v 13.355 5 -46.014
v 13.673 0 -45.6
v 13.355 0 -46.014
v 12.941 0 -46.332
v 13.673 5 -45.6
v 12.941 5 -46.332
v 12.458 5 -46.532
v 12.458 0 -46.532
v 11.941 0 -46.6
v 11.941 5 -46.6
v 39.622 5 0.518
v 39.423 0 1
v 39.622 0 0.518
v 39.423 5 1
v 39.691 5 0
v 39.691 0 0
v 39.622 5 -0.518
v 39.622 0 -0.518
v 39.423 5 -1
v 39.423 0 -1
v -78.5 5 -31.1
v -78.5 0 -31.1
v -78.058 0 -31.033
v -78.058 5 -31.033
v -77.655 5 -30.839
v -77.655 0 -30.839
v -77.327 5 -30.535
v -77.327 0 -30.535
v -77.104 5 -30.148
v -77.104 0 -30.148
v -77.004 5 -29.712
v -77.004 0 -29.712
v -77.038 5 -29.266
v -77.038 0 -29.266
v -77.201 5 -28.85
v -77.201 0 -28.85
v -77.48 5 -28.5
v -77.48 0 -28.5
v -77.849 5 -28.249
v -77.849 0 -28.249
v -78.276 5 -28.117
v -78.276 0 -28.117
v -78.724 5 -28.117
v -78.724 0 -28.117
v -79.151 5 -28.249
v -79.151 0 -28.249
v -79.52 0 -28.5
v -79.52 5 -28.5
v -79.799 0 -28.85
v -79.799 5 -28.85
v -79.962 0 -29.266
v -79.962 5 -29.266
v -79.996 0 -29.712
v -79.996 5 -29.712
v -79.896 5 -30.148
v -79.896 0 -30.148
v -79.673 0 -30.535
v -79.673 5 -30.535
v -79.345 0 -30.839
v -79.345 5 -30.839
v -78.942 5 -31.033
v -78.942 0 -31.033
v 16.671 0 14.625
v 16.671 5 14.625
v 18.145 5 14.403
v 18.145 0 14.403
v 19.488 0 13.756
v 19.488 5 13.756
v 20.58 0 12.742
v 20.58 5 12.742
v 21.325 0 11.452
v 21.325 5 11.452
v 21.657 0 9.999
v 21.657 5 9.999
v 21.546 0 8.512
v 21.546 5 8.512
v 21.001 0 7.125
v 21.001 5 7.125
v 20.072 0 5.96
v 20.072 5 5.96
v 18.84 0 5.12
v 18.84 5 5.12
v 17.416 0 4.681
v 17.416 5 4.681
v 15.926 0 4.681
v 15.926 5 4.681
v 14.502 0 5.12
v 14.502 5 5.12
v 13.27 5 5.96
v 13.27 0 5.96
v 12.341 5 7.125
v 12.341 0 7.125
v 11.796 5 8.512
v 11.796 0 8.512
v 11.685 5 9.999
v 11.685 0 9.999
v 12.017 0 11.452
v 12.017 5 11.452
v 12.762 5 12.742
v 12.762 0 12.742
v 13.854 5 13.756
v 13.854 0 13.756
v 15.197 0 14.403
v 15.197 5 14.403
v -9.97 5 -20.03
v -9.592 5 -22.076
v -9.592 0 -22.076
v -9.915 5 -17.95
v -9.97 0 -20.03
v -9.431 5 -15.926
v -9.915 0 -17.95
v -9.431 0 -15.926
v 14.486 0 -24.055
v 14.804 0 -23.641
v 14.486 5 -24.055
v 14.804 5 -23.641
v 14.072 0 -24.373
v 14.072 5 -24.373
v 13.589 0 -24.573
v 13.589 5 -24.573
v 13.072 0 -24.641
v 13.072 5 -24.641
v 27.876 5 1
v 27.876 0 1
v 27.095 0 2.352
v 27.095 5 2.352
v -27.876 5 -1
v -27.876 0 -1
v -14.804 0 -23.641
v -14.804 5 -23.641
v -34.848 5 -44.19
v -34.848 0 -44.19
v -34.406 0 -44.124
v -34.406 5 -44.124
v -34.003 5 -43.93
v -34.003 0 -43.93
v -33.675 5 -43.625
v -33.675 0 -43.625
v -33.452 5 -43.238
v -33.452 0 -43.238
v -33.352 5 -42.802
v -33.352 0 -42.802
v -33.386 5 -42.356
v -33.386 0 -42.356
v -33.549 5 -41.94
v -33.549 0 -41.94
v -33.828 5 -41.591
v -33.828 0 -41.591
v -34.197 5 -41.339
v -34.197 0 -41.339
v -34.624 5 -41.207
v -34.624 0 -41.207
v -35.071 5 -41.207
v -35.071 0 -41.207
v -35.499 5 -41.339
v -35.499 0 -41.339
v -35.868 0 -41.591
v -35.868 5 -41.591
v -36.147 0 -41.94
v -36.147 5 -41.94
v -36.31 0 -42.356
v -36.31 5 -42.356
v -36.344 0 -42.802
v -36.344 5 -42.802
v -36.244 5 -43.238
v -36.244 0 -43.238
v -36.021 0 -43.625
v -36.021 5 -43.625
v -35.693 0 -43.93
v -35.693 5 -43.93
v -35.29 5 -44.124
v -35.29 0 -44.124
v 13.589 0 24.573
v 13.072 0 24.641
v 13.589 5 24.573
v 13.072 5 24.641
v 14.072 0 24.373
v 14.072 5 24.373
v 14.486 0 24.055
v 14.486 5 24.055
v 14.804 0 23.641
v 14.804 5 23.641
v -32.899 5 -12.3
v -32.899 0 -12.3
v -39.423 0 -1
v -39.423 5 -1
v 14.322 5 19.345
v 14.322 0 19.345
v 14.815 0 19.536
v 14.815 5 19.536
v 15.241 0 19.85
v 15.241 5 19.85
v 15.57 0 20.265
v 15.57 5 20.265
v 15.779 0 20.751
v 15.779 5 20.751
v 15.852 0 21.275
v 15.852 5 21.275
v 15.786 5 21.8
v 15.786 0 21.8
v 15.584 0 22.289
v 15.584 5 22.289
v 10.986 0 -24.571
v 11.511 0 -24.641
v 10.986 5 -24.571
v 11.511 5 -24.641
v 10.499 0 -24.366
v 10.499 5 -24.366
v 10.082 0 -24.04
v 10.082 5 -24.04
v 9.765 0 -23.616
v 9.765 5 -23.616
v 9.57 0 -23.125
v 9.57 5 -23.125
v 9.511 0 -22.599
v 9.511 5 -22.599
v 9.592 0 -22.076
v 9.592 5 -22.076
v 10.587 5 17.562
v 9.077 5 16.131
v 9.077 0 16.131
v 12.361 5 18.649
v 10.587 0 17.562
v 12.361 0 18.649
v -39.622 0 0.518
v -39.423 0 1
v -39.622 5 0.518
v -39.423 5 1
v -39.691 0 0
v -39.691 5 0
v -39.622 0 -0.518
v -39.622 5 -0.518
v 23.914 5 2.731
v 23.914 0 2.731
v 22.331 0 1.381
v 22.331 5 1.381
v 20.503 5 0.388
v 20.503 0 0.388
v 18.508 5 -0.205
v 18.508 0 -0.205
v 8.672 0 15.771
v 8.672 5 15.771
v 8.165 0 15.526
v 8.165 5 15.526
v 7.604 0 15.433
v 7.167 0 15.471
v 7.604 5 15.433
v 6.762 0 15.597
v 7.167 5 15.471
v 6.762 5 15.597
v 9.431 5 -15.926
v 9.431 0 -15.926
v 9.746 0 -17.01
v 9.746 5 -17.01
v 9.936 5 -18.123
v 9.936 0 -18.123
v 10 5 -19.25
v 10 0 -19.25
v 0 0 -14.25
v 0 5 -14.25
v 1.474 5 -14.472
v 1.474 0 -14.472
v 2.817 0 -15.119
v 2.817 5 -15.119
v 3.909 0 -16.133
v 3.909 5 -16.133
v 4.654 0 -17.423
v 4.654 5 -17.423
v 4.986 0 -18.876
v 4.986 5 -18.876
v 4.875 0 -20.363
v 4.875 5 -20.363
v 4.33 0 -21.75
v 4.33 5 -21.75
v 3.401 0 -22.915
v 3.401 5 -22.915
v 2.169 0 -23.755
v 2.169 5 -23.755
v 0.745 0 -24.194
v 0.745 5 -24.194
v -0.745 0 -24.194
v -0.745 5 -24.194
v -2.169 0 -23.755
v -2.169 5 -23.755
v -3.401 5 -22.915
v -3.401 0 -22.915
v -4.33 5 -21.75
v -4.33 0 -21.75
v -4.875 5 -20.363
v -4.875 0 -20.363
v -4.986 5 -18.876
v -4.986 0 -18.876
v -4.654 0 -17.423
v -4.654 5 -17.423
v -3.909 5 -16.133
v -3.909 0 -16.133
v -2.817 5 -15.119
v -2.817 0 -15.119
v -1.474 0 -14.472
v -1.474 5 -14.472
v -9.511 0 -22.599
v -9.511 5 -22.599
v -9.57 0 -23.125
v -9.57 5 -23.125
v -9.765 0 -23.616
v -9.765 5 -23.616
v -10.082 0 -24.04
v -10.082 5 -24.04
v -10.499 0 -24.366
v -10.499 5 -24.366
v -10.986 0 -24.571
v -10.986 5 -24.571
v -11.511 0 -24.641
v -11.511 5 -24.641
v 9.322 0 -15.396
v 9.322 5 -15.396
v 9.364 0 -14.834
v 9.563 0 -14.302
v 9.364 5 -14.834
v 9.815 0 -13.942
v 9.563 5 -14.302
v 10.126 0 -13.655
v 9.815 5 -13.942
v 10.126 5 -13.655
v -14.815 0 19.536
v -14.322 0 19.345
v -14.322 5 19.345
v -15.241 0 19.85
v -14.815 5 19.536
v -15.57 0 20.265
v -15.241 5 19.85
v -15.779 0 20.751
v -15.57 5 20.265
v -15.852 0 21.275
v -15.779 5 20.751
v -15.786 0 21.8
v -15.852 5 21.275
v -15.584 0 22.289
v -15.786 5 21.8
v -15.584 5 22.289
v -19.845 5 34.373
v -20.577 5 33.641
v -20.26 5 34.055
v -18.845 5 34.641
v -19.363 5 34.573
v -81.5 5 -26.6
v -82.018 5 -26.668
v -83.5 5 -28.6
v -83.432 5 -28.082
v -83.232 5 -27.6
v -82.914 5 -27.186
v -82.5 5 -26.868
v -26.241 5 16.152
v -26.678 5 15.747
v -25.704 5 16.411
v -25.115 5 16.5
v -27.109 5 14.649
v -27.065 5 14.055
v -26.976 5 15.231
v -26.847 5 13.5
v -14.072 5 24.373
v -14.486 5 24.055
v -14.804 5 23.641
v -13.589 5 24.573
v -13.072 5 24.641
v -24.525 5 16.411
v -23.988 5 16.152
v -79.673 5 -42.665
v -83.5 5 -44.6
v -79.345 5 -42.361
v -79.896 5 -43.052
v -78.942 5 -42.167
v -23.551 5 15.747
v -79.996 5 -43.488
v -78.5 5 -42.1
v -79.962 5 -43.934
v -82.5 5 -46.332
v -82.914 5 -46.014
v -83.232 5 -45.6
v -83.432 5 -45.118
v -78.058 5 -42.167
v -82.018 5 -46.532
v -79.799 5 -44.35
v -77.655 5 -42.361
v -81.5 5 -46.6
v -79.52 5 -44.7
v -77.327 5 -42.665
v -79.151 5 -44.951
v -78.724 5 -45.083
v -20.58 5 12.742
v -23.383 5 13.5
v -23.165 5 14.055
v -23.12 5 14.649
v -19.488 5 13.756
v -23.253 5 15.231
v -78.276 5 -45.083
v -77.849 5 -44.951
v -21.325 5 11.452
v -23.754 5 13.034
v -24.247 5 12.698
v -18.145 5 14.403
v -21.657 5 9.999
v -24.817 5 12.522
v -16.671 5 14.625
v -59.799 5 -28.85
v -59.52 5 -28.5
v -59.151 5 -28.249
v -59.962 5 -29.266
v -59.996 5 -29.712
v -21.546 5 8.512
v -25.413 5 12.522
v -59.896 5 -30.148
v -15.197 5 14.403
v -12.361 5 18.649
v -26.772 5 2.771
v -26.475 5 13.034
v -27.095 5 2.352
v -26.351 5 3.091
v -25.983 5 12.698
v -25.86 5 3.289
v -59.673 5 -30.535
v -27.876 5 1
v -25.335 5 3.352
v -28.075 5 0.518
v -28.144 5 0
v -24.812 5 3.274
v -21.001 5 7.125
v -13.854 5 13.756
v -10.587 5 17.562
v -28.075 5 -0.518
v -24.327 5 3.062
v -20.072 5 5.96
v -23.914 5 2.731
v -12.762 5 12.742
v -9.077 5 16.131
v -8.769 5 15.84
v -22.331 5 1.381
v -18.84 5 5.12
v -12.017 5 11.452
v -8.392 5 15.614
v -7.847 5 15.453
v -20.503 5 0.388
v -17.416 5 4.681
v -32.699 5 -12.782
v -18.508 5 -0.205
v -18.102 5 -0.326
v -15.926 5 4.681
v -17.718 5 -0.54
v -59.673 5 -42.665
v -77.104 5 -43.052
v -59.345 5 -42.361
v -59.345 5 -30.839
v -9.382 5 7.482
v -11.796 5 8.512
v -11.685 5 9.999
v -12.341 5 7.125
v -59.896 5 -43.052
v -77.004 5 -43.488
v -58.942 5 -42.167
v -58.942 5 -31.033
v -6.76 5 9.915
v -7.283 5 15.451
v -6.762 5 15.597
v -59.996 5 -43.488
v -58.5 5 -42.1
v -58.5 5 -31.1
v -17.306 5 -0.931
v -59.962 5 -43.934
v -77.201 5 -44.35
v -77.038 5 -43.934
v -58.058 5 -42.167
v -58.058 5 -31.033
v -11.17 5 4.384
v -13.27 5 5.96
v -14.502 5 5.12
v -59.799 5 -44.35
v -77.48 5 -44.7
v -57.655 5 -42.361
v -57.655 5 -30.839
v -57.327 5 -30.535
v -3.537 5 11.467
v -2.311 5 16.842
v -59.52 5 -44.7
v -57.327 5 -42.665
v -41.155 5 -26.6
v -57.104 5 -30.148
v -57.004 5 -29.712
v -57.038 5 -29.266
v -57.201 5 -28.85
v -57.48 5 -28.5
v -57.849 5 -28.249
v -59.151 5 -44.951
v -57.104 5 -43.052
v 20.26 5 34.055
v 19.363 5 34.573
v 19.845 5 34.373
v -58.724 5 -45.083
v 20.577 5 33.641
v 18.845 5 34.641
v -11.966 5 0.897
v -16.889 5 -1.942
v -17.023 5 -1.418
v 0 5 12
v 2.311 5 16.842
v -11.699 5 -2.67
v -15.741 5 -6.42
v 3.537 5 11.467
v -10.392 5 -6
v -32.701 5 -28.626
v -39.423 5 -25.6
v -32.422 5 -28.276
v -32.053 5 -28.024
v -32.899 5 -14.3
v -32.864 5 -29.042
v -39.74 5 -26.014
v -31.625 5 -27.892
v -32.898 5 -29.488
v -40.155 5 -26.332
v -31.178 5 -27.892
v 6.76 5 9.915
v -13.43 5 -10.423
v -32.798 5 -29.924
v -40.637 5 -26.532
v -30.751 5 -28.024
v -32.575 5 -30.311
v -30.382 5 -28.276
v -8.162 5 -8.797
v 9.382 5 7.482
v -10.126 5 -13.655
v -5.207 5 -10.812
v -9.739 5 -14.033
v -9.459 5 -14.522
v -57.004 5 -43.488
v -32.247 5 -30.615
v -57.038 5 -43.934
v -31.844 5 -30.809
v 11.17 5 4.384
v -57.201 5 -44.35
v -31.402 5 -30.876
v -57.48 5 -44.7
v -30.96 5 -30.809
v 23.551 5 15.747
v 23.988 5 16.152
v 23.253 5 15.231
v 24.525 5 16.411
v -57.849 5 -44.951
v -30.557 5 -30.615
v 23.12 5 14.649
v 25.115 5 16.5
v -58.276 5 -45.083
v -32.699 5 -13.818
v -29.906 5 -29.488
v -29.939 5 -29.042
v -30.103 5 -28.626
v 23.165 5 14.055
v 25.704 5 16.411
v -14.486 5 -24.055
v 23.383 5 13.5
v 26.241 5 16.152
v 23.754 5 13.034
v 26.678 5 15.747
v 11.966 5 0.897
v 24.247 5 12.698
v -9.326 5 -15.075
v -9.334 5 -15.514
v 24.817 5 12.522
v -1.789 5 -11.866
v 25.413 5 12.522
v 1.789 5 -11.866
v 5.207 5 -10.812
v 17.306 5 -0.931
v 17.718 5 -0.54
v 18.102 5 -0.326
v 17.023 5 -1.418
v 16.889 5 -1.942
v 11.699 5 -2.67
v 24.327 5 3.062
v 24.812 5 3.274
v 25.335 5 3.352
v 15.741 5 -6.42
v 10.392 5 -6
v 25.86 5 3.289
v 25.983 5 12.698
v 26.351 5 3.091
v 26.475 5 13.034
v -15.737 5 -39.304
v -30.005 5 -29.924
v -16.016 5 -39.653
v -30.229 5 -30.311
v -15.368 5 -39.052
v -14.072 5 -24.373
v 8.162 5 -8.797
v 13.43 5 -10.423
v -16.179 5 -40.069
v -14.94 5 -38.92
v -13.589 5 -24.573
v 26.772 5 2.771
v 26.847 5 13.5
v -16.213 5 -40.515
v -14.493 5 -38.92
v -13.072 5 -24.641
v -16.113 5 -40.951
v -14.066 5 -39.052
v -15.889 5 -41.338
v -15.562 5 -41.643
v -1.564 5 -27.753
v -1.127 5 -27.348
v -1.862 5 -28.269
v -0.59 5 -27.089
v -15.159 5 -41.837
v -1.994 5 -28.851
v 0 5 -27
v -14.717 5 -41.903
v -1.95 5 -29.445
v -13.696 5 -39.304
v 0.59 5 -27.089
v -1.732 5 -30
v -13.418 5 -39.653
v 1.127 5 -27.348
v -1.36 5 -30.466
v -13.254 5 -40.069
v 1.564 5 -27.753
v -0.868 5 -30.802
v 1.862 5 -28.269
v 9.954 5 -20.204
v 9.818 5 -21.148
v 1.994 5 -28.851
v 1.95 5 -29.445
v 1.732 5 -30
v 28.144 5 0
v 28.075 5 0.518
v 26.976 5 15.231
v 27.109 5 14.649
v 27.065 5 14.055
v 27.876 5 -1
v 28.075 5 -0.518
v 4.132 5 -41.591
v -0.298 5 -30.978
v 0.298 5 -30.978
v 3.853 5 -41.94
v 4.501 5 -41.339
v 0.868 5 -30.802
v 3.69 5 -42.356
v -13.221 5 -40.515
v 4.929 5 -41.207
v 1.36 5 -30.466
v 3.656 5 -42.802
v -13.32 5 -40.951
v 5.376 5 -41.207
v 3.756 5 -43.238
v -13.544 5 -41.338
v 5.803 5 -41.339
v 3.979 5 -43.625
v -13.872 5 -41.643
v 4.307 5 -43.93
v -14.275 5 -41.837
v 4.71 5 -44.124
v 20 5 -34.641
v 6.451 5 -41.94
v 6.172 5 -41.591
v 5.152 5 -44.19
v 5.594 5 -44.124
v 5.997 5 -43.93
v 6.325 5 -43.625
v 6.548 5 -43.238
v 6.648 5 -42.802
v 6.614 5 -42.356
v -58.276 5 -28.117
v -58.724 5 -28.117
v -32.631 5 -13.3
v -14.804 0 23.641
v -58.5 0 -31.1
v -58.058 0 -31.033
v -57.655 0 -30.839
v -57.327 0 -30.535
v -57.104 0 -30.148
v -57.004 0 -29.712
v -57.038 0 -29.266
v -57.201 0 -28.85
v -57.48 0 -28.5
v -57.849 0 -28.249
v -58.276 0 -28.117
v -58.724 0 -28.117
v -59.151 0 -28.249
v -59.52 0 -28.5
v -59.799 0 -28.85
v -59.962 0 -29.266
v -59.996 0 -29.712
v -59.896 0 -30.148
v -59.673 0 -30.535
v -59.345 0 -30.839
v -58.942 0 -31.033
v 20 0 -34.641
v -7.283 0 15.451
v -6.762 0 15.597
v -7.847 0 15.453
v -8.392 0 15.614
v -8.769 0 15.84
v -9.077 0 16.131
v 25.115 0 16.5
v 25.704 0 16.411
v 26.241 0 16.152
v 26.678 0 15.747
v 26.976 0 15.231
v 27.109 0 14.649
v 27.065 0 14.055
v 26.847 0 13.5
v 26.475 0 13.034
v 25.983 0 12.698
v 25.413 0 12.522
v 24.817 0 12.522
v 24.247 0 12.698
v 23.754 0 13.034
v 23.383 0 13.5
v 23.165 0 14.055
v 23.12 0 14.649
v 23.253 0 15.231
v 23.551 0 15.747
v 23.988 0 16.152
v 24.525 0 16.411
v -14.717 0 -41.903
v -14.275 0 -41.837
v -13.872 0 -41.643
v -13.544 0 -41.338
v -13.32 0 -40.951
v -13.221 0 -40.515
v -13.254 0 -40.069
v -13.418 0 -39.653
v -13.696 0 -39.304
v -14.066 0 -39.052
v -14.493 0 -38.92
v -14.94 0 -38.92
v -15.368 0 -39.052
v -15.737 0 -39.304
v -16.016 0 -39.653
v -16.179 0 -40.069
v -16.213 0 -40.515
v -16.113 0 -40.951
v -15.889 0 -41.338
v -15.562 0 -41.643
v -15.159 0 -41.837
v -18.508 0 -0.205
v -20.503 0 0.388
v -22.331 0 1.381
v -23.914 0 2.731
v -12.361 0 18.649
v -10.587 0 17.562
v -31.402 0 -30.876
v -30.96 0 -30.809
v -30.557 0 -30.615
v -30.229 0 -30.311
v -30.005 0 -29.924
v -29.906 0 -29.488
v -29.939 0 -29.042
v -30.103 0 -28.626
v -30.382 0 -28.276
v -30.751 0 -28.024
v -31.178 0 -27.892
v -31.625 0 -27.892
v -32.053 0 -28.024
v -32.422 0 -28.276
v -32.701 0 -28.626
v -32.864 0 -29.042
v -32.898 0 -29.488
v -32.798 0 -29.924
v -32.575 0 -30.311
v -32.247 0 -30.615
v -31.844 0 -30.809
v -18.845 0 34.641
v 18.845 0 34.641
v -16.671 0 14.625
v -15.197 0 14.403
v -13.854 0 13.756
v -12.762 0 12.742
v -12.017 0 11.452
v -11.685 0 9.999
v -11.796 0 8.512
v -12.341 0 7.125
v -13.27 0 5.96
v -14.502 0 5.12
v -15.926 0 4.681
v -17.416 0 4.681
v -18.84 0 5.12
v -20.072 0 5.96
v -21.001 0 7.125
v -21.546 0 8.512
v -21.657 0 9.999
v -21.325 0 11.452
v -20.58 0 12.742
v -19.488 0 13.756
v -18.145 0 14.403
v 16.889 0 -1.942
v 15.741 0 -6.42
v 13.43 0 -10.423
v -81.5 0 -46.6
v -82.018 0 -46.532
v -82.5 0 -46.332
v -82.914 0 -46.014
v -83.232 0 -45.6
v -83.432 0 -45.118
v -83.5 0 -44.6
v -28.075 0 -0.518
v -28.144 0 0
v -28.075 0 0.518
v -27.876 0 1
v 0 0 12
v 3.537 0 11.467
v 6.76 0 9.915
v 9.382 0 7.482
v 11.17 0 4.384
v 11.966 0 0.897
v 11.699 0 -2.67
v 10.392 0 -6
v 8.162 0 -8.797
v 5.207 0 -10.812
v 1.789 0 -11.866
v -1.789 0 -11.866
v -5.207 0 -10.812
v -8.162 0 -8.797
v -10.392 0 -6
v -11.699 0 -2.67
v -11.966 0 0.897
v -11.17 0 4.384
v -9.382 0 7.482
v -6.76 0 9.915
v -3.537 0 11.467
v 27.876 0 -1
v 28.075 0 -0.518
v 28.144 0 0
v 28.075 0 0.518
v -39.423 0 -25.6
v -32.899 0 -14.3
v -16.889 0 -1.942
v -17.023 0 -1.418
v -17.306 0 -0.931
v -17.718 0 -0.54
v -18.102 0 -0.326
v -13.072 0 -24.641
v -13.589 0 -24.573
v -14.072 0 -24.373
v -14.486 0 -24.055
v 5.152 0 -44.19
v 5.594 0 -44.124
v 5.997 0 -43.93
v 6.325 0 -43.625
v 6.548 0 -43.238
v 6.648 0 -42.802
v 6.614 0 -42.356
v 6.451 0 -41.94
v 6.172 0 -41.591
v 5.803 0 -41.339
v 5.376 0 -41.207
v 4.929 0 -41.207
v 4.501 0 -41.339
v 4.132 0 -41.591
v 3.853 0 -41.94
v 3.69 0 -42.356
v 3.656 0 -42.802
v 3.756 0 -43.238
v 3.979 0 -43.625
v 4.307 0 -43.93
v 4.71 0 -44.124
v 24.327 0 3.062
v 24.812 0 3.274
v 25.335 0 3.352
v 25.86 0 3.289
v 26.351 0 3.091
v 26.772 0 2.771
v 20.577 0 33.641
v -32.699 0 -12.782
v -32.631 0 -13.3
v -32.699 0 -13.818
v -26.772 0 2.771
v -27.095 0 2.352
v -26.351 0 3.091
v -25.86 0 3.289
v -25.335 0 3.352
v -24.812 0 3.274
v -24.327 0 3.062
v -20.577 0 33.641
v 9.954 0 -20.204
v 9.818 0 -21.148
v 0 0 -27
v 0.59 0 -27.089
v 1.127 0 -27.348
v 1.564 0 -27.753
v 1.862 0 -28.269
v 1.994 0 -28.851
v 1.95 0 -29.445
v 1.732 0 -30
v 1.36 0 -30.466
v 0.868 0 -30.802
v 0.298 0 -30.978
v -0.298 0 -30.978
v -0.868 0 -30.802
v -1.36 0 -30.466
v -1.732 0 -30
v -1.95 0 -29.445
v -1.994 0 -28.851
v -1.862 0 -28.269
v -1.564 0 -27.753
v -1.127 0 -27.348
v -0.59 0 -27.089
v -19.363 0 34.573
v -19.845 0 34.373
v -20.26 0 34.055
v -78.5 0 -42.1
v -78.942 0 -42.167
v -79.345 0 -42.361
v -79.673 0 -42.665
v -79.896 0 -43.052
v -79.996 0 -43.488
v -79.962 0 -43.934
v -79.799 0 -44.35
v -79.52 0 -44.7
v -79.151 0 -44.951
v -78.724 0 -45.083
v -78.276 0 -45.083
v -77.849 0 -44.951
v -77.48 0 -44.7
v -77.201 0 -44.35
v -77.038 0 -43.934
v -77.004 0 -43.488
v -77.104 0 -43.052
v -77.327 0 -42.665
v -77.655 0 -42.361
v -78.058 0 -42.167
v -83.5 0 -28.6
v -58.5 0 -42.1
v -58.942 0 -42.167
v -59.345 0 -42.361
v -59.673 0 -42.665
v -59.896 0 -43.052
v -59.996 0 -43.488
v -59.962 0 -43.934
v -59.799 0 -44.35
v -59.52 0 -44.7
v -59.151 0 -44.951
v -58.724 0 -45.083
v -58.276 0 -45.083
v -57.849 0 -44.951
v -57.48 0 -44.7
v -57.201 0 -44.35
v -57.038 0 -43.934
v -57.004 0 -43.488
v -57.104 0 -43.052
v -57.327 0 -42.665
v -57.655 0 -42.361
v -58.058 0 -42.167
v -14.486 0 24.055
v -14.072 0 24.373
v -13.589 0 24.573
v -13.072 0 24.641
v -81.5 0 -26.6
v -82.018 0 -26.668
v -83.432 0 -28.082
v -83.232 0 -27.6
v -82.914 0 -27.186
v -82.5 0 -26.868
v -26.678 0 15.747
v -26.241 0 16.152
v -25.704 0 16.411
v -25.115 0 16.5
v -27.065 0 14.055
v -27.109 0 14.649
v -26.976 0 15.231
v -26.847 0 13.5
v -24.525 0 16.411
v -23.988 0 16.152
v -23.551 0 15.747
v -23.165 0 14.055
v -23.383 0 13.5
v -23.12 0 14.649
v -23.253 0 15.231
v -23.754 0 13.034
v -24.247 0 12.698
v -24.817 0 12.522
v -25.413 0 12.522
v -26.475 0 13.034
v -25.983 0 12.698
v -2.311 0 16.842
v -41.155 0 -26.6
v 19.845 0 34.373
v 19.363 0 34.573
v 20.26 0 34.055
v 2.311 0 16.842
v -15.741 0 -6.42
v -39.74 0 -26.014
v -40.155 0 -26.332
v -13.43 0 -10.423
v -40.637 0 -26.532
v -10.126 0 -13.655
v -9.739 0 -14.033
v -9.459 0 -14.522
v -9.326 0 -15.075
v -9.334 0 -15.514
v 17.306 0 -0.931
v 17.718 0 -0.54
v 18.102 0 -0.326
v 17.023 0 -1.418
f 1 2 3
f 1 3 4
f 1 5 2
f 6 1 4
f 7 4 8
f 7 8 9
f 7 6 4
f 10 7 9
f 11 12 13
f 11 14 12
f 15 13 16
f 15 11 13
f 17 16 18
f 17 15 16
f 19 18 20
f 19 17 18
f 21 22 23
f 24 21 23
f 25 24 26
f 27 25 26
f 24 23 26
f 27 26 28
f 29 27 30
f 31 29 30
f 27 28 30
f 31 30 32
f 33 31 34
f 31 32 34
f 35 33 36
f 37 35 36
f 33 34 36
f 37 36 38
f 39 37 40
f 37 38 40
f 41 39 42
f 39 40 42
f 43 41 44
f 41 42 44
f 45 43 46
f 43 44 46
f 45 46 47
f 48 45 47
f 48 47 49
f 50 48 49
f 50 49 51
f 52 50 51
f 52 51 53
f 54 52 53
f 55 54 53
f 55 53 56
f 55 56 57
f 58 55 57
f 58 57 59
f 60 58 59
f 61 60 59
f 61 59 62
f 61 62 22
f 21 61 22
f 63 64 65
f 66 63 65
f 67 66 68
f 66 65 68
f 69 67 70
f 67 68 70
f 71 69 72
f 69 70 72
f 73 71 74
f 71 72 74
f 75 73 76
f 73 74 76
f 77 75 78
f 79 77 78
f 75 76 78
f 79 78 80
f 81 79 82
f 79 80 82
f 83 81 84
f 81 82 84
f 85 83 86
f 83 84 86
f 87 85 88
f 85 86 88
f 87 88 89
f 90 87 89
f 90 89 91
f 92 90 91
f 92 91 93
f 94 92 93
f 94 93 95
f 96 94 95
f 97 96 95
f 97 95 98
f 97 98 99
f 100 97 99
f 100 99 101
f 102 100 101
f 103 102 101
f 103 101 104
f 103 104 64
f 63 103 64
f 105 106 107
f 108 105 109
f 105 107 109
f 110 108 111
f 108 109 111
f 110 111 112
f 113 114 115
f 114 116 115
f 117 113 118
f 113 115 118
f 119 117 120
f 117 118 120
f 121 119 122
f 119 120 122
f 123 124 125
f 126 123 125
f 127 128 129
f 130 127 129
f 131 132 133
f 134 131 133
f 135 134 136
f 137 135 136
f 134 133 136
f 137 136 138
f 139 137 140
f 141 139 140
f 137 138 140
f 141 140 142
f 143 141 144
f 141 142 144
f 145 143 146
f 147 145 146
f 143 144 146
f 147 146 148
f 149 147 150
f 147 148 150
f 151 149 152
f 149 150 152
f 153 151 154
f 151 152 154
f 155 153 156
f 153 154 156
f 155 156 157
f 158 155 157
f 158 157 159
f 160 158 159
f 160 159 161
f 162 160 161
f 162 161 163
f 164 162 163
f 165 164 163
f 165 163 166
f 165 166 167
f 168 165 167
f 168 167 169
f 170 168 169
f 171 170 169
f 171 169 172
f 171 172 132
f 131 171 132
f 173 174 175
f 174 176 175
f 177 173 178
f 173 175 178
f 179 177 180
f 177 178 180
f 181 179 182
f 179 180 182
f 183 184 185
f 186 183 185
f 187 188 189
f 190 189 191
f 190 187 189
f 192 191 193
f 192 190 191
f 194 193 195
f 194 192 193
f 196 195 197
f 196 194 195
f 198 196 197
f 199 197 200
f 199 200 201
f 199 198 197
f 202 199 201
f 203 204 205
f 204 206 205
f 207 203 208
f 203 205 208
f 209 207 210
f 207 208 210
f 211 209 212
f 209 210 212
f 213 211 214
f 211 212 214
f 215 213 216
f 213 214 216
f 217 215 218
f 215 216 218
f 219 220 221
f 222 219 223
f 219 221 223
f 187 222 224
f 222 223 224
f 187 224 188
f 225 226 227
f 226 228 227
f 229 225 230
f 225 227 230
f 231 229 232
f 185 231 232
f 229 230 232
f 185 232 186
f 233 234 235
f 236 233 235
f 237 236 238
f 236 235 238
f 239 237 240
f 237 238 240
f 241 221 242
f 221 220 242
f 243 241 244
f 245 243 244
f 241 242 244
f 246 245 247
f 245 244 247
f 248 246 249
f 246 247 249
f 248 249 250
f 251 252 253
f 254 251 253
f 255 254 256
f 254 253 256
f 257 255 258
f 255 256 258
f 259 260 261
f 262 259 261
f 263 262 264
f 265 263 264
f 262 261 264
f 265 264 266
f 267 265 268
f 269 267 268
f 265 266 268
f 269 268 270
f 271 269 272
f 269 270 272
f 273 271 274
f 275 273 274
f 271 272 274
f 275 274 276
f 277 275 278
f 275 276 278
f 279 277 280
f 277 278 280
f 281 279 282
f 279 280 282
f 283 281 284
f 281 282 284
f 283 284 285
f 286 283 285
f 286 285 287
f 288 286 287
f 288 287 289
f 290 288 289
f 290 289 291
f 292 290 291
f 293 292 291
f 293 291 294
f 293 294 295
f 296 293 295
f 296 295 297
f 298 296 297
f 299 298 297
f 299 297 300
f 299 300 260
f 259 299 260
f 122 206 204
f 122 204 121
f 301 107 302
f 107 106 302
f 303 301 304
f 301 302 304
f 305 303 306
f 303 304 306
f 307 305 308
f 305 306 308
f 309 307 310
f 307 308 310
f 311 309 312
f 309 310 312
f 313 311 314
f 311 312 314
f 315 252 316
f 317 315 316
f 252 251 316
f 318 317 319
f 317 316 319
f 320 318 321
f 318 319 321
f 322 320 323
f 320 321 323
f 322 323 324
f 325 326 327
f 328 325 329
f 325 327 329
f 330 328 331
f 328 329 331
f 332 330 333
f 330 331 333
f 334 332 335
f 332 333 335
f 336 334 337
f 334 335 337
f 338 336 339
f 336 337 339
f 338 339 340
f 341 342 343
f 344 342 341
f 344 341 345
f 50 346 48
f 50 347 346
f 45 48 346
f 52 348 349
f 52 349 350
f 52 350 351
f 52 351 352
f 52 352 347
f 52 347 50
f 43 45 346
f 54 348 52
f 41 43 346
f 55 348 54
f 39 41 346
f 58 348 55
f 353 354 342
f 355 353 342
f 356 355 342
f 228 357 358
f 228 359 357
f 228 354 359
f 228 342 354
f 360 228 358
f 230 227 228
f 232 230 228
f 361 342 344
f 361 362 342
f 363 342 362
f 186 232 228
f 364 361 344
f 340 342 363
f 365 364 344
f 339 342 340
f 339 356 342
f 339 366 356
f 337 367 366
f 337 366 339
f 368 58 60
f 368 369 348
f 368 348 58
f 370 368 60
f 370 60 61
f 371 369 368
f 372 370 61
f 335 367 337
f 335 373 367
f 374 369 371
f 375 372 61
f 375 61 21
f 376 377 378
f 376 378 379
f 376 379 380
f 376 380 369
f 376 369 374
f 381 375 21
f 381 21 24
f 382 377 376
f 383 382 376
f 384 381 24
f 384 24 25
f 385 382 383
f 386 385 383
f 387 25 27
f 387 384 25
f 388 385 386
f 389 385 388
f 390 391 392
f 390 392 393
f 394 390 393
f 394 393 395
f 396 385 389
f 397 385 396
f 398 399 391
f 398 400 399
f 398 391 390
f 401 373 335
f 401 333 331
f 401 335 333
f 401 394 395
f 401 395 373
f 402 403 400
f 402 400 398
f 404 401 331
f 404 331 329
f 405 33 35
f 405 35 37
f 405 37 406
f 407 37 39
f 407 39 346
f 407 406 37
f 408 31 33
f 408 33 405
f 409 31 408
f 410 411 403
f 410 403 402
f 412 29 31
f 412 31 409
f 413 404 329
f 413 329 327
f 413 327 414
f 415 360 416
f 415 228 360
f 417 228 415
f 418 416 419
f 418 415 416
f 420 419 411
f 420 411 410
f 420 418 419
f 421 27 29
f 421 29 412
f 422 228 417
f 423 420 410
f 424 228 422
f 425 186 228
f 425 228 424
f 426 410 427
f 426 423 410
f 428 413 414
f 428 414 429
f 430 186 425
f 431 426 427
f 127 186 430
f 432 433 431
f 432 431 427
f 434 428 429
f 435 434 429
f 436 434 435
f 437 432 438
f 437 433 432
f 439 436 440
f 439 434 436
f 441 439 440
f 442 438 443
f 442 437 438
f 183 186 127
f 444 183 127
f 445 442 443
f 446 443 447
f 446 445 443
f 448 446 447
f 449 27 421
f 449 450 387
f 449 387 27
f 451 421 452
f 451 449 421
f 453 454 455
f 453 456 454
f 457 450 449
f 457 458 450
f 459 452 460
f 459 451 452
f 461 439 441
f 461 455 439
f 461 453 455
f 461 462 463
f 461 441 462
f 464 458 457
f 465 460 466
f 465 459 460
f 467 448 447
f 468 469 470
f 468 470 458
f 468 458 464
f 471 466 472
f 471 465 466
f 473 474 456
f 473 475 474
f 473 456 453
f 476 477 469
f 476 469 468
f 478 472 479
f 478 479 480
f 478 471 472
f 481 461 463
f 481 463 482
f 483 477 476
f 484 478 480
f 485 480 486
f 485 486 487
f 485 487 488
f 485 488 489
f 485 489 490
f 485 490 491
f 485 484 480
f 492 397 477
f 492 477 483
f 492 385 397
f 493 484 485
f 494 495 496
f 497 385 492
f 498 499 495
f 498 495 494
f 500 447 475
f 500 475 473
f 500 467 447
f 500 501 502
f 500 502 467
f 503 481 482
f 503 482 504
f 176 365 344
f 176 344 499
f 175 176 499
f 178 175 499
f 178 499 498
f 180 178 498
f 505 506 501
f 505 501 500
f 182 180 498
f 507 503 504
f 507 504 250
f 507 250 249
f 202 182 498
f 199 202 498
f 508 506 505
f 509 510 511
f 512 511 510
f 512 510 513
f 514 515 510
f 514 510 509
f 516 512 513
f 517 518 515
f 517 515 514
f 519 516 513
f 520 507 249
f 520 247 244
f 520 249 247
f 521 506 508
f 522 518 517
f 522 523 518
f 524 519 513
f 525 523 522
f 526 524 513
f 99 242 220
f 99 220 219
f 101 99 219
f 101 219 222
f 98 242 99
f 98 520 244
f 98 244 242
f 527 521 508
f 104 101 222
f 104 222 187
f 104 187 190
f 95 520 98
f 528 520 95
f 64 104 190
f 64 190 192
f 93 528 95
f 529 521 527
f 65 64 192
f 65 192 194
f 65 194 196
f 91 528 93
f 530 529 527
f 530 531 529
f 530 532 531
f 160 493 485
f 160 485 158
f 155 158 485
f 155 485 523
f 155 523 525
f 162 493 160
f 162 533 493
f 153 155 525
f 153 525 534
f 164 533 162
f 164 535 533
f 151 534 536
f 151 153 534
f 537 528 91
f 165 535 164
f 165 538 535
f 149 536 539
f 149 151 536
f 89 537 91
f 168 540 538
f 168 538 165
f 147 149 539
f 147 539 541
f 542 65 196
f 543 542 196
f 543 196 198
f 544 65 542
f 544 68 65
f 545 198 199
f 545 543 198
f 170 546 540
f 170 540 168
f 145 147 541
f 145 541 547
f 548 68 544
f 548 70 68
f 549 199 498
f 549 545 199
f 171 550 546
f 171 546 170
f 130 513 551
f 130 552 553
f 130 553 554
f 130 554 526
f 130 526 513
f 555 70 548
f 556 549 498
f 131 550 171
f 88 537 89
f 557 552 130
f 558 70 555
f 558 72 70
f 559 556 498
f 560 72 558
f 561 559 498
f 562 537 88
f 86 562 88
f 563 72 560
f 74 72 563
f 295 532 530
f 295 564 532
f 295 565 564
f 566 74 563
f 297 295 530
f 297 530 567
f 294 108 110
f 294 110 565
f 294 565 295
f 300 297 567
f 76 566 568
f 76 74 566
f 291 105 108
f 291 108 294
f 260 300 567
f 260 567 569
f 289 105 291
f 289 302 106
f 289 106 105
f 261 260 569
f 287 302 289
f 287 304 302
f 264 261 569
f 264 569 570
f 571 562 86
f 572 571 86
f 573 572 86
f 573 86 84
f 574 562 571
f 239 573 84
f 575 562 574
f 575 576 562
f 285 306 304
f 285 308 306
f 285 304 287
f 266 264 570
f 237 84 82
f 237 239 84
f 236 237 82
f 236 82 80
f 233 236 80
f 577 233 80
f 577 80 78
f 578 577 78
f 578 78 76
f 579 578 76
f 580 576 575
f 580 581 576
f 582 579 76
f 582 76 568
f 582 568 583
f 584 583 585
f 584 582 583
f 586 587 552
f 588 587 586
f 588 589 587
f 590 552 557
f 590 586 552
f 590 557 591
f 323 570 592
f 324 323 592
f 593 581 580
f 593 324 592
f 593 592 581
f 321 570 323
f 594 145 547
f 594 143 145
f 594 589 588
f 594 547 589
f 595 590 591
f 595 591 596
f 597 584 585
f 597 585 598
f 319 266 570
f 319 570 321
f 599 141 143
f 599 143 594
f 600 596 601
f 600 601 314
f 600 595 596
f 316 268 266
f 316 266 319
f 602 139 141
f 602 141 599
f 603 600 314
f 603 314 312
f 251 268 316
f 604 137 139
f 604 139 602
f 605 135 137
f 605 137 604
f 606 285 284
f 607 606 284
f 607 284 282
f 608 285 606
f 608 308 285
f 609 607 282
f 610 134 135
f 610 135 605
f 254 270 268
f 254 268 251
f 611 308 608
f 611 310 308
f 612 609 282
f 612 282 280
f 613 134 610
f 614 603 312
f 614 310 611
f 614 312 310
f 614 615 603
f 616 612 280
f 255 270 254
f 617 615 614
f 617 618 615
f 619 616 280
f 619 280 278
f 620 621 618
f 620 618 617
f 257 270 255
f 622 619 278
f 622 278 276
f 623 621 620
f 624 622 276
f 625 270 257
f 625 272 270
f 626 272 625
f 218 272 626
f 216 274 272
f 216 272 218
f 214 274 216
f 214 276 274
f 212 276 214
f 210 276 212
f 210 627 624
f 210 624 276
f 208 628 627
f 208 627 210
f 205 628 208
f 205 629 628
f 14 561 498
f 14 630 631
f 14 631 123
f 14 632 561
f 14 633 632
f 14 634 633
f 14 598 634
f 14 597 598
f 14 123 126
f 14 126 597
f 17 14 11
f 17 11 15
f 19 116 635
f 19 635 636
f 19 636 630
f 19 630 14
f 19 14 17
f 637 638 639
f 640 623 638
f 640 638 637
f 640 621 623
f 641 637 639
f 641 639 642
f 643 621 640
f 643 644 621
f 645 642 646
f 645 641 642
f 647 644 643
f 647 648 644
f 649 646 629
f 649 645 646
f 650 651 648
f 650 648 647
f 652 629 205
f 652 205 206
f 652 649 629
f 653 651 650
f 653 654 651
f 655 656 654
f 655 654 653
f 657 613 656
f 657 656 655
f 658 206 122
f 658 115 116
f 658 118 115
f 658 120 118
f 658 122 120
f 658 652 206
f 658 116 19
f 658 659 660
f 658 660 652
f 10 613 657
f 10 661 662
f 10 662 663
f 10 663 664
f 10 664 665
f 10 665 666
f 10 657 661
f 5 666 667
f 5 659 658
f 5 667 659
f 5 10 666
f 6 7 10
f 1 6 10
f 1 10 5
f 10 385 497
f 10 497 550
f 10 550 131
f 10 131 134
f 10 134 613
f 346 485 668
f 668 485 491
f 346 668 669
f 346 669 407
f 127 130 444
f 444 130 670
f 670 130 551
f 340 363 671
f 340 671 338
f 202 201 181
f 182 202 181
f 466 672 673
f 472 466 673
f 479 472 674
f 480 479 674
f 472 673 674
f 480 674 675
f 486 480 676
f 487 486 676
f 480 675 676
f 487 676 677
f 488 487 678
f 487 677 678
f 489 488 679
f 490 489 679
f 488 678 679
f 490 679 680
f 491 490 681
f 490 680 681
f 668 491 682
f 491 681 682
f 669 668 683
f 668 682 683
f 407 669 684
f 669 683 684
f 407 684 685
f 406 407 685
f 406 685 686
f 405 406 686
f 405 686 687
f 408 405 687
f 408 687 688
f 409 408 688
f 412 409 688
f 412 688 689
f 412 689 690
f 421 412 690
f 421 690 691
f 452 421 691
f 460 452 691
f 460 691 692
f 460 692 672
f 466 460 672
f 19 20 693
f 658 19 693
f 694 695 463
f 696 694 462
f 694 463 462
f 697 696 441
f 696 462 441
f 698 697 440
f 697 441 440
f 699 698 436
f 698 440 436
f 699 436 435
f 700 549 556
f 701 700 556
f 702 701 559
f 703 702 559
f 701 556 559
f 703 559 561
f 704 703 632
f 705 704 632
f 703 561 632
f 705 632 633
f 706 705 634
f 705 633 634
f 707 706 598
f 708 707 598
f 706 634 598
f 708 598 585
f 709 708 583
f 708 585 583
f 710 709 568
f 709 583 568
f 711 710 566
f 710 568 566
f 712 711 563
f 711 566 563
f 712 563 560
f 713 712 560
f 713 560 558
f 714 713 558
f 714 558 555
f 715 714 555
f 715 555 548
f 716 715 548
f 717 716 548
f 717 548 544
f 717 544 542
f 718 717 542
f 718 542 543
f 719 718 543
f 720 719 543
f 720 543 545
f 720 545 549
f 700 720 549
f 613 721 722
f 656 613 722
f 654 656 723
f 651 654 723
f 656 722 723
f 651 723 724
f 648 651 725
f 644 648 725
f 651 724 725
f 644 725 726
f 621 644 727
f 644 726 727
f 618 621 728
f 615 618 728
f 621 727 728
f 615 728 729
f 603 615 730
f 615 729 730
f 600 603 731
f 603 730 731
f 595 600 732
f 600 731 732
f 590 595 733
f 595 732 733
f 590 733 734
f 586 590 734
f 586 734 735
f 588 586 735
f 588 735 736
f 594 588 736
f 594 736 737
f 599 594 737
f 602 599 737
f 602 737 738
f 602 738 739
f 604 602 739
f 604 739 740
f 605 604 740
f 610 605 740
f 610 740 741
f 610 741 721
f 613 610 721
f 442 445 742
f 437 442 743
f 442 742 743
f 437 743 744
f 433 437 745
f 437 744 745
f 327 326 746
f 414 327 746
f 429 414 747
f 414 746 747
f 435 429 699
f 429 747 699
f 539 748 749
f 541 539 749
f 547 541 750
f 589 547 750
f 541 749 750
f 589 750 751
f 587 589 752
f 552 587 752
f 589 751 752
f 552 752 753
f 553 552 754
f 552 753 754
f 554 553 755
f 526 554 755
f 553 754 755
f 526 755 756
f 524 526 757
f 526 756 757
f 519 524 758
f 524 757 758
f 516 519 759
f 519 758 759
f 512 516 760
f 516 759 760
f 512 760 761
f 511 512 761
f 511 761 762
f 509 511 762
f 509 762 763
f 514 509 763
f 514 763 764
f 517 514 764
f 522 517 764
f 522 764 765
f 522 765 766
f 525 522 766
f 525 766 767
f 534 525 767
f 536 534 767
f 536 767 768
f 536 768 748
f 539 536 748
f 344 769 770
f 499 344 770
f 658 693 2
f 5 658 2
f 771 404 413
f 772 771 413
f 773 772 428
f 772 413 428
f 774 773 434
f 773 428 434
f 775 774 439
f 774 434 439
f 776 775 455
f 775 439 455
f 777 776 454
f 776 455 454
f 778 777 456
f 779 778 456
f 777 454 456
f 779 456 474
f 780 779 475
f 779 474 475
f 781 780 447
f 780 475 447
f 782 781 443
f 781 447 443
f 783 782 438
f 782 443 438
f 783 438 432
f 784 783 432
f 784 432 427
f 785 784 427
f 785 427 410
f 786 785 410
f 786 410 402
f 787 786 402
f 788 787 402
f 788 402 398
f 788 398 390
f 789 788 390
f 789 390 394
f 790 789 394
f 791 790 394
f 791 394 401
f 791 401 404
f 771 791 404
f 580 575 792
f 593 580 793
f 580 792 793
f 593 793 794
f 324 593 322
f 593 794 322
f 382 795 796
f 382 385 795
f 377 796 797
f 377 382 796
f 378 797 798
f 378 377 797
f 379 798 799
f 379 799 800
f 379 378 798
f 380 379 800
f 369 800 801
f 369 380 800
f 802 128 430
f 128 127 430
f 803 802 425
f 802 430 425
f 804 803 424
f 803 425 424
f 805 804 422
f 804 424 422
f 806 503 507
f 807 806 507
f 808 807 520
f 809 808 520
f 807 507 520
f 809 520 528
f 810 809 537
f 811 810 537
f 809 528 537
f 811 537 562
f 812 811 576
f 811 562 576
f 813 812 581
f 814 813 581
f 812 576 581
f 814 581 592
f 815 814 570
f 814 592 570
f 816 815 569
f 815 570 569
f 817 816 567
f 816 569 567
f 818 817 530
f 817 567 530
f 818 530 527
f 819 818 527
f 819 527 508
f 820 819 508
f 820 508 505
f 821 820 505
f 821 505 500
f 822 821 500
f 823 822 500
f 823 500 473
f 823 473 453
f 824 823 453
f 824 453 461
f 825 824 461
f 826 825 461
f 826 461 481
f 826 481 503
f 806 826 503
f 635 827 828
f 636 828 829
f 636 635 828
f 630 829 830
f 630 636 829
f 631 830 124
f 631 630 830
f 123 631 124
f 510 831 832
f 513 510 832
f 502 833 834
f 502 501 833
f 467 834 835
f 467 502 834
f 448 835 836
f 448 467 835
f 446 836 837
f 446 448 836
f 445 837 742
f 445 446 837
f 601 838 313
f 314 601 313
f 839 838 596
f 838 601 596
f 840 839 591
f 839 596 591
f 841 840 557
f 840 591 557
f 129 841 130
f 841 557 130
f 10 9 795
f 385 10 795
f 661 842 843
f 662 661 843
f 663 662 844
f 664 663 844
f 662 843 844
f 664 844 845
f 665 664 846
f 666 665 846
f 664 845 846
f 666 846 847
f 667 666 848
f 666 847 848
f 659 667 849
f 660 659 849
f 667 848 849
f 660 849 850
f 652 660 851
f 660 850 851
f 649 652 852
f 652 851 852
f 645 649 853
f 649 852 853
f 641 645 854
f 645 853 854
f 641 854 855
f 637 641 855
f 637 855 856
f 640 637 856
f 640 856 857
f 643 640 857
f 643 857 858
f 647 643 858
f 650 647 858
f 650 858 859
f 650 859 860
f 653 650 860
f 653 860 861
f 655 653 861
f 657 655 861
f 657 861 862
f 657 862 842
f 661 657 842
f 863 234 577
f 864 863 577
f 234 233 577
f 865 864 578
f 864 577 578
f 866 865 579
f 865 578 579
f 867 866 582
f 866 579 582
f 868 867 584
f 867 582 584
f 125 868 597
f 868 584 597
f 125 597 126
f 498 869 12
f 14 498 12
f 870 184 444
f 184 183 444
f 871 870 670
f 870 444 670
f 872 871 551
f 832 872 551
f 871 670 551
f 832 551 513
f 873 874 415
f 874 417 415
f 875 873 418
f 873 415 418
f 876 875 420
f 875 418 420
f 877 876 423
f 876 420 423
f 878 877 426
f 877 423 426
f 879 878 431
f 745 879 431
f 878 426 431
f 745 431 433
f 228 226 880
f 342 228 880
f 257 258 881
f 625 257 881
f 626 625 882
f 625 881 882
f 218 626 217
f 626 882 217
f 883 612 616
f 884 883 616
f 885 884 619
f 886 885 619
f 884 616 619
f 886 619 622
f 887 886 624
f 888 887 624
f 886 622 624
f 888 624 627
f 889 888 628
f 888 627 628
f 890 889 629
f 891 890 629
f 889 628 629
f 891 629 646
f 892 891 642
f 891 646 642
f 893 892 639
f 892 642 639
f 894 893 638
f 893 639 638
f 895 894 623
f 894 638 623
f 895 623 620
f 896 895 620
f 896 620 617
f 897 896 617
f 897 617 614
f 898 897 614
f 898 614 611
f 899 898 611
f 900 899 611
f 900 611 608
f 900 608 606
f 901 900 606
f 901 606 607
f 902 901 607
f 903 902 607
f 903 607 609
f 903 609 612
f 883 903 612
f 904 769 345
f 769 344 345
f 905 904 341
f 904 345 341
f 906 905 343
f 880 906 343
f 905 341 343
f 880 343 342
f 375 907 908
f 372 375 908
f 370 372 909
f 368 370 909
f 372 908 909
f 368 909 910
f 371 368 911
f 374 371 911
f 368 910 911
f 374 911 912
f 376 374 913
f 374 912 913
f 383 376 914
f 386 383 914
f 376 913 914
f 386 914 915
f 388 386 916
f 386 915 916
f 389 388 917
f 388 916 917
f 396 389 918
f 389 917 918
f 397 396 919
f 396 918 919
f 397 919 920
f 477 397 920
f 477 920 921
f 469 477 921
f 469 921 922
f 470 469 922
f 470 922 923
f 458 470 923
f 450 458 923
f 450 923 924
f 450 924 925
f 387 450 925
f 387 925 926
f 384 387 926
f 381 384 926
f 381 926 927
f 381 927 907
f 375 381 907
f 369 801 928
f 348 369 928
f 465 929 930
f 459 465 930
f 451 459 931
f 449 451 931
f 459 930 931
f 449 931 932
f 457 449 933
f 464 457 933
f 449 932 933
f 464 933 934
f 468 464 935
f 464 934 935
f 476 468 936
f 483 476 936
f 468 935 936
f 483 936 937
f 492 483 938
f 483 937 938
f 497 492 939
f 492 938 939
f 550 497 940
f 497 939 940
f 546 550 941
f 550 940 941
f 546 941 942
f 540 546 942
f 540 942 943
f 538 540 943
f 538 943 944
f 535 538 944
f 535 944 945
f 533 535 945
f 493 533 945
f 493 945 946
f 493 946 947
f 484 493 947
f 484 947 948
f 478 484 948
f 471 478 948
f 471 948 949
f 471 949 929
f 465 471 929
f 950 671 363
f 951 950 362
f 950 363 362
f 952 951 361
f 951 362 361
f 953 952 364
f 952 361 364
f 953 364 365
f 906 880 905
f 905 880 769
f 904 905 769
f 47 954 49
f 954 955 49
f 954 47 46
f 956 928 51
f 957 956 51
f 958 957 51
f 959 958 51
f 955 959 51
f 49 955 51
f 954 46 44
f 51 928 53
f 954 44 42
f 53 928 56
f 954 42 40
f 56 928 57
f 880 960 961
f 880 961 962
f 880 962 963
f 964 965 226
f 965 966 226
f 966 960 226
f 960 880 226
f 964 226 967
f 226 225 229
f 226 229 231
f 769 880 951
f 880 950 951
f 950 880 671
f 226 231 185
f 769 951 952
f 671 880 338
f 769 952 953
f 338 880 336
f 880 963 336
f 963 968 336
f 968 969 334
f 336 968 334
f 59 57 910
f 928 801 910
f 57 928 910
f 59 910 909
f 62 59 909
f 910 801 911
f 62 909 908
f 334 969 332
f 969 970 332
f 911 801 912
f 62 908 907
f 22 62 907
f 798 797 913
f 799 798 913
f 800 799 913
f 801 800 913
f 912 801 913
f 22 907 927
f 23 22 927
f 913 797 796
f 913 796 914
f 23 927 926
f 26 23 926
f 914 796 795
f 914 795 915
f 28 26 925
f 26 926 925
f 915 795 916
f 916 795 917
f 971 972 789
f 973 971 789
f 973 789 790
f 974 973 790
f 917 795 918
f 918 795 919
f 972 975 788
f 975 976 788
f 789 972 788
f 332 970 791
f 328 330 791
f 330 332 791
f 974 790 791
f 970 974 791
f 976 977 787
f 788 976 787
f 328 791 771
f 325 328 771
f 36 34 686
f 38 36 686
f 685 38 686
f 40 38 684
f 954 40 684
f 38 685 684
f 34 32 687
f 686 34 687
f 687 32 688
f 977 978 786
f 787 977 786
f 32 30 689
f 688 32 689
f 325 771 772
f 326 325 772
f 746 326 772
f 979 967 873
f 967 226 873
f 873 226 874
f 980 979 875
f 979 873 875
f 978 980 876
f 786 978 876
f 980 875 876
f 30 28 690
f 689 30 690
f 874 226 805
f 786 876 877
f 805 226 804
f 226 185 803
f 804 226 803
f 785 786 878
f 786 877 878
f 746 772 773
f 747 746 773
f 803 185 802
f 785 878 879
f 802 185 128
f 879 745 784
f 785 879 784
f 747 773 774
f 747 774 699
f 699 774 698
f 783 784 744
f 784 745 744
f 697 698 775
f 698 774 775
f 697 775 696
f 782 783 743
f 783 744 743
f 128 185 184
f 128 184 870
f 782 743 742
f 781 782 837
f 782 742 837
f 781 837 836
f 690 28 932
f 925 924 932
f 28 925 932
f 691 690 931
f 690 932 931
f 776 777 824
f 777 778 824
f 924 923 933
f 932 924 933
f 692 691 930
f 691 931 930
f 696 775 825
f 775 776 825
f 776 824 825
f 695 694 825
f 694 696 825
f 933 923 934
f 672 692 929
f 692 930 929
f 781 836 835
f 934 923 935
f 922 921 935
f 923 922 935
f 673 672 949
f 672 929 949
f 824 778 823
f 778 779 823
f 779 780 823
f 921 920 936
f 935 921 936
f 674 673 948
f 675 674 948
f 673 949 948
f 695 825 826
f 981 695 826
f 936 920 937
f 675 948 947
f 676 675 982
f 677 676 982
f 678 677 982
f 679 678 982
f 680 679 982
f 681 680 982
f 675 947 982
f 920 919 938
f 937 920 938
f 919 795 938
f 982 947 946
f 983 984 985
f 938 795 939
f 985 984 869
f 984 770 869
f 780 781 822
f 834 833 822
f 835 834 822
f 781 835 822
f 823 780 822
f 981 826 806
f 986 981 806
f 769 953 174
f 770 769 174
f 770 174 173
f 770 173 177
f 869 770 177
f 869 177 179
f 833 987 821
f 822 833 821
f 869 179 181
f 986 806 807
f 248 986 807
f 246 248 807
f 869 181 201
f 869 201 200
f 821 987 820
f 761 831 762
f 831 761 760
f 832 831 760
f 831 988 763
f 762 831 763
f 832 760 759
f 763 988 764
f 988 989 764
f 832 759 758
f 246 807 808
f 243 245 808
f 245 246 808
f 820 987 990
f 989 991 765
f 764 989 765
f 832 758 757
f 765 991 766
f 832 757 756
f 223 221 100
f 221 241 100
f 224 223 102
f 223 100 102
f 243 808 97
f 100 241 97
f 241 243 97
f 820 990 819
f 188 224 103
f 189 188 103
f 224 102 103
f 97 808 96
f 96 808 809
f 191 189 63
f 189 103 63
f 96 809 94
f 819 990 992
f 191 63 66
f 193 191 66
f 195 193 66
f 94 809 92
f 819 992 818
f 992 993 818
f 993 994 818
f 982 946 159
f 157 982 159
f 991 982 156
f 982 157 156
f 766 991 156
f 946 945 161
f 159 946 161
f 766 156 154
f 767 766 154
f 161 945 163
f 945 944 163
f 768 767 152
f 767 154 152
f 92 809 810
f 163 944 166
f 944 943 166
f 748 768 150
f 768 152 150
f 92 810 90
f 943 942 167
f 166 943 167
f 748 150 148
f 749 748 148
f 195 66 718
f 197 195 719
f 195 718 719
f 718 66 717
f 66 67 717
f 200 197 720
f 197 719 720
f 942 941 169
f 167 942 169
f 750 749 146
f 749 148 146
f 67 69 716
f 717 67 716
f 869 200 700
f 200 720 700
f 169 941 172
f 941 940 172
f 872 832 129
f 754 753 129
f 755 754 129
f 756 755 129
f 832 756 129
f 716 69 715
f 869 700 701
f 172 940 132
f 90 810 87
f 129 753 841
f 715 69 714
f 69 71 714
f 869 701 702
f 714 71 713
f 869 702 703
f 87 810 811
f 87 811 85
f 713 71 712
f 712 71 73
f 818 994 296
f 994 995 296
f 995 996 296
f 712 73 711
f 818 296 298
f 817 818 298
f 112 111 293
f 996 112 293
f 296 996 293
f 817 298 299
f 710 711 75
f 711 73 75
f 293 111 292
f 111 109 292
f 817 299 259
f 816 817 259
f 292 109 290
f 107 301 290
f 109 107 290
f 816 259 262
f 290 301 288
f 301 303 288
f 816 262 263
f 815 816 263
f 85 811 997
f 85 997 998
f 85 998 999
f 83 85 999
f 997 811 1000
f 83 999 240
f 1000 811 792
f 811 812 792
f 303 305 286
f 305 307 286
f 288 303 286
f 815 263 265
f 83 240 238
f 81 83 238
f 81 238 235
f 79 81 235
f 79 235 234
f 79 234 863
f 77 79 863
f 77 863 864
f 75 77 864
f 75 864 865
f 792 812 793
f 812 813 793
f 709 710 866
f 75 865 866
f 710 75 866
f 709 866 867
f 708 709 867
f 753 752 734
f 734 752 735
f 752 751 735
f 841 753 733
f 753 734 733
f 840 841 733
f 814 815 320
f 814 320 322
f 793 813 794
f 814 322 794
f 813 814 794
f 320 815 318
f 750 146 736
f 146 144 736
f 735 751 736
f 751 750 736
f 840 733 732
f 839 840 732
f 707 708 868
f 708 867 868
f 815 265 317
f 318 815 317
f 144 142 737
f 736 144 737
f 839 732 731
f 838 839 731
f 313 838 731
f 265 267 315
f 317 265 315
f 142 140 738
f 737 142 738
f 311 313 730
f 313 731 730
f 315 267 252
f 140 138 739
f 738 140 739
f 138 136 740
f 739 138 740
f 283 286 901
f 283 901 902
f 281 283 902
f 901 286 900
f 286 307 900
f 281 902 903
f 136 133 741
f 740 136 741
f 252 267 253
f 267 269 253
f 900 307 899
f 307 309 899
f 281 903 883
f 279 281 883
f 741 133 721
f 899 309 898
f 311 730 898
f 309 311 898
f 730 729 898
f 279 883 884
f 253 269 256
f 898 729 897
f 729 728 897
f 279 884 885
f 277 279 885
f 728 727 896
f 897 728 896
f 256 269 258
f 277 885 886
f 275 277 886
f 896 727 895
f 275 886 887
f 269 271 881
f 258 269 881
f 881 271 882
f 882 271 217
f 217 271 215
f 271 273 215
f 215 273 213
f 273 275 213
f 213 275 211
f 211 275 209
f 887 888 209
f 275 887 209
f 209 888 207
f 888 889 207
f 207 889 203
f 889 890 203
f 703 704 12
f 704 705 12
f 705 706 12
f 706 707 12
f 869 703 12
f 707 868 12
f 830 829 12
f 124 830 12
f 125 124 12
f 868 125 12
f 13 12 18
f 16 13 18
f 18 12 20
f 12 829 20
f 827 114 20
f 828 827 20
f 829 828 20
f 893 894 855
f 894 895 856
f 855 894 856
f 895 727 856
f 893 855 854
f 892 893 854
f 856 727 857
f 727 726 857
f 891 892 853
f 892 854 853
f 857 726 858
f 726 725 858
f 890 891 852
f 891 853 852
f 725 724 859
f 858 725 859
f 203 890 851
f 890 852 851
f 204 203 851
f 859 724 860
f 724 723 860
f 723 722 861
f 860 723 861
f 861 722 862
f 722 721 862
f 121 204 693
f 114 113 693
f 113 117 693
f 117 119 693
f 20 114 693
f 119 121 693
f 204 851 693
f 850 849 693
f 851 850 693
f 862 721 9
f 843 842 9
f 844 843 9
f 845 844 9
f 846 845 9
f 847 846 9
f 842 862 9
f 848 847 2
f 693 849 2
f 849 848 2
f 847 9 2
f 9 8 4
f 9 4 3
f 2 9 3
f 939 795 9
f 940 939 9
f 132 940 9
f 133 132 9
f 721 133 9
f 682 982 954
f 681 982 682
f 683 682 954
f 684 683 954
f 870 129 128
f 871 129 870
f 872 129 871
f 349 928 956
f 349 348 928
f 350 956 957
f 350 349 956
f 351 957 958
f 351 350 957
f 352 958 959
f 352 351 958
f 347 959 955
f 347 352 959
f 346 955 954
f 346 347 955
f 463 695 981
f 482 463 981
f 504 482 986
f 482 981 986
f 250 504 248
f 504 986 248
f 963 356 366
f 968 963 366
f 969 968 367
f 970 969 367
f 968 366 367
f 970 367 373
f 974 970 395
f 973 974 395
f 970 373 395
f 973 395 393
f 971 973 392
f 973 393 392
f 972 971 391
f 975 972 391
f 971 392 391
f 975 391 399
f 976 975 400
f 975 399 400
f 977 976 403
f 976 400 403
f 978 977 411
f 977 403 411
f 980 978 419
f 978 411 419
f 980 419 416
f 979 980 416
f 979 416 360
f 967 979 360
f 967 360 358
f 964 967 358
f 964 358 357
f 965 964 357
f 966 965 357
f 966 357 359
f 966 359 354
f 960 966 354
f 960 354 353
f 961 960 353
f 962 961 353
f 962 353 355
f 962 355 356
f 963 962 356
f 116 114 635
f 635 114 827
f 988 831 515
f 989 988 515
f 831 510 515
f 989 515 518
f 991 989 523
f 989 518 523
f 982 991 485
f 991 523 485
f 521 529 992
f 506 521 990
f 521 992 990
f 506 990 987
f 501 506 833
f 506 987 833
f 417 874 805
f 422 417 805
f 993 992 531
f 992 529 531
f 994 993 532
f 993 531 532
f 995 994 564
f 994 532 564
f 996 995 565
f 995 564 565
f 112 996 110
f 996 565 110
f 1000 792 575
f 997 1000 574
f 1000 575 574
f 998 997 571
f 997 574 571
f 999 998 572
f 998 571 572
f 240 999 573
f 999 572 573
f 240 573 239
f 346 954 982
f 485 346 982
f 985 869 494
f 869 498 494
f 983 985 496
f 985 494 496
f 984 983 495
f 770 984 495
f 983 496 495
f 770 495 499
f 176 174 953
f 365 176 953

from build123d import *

# Parameters (mm, degrees)
EXTRUDE_1_DEPTH     = 5
SKETCH_2_R          = 2
SKETCH_2_R_2        = 5
SKETCH_2_R_3        = 12
CUT_EXTRUDE_1_DEPTH = 96.753903315
SKETCH_3_R          = 1.5
CUT_EXTRUDE_2_DEPTH = 96.753903315
CUT_EXTRUDE_4_DEPTH = 96.753903315
FILLET_1_R          = 2
FILLET_2_R          = 2
SKETCH_5_R          = 1.5
CUT_EXTRUDE_5_DEPTH = 10


with BuildPart() as part:
    # 草图1 → 凸台-拉伸1 (new body)
    with BuildSketch(Plane(origin=(0, 0, 0), x_dir=(1, 0, 0), z_dir=(0, 1, 0))):
        Polygon((20, -34.641016151), (40, 0), (20, 34.641016151), (13.095477456, 46.6), (-83.5, 46.6), (-83.5, 26.6), (-40, 26.6), (-32.32124142, 13.3), (-40, 0), (-20, -34.641016151), align=None)
    extrude(amount=EXTRUDE_1_DEPTH)

    # 草图2 → 切除-拉伸1 (cut, through all)
    with BuildSketch(Plane(origin=(0, 5, 0), x_dir=(1, 0, 0), z_dir=(0, 1, 0))):
        with Locations(Location((0, 29, 0), (0, 0, 270))):
            Circle(SKETCH_2_R)
        with Locations(Location((25.11473671, -14.5, 0), (0, 0, 270))):
            Circle(SKETCH_2_R)
        with Locations(Location((-25.11473671, -14.5, 0), (0, 0, 270))):
            Circle(SKETCH_2_R)
        with Locations(Location((0, 19.25, 0), (0, 0, 270))):
            Circle(SKETCH_2_R_2)
        with Locations(Location((0, 0, 0), (0, 0, 270))):
            Circle(SKETCH_2_R_3)
        with Locations(Location((16.670989023, -9.625, 0), (0, 0, 270))):
            Circle(SKETCH_2_R_2)
        with Locations(Location((-16.670989023, -9.625, 0), (0, 0, 270))):
            Circle(SKETCH_2_R_2)
    extrude(amount=-CUT_EXTRUDE_1_DEPTH, mode=Mode.SUBTRACT)

    # 草图3 → 切除-拉伸2 (cut, through all)
    with BuildSketch(Plane.XZ):
        with Locations(Location((-78.5, -29.6, 0), (0, 0, 270))):
            Circle(SKETCH_3_R)
        with Locations(Location((-58.5, -29.6, 0), (0, 0, 270))):
            Circle(SKETCH_3_R)
        with Locations(Location((-58.5, -43.6, 0), (0, 0, 90))):
            Circle(SKETCH_3_R)
        with Locations(Location((-78.5, -43.6, 0), (0, 0, 90))):
            Circle(SKETCH_3_R)
    extrude(amount=-CUT_EXTRUDE_2_DEPTH, mode=Mode.SUBTRACT)

    # 草图4 → 切除-拉伸4 (cut, through all)
    with BuildSketch(Plane.XZ):
        with BuildLine():
            ThreePointArc((-16.995979196, -0.369717674), (-22.006018762, 1.167018108), (-25.550949616, 5.026489386))
            Line((-25.550949616, 5.026489386), (-28.452994616, 0))
            Line((-28.452994616, 0), (-14.226497308, -24.641016151))
            Line((-14.226497308, -24.641016151), (-8.422407308, -24.641016151))
            ThreePointArc((-8.422407308, -24.641016151), (-9.992342053, -19.641280338), (-8.818174496, -14.534090909))
            ThreePointArc((-8.818174496, -14.534090909), (-14.722431864, -8.5), (-16.995979196, -0.369717674))
        make_face()
        with BuildLine():
            Line((28.452994616, 0), (25.550949616, 5.026489386))
            ThreePointArc((25.550949616, 5.026489386), (22.006018762, 1.167018108), (16.995979196, -0.369717674))
            ThreePointArc((16.995979196, -0.369717674), (14.722431864, -8.5), (8.818174496, -14.534090909))
            ThreePointArc((8.818174496, -14.534090909), (9.700044973, -16.819130296), (10, -19.25))
            ThreePointArc((10, -19.25), (9.597501578, -22.058551844), (8.422407308, -24.641016151))
            Line((8.422407308, -24.641016151), (14.226497308, -24.641016151))
            Line((14.226497308, -24.641016151), (28.452994616, 0))
        make_face()
        with BuildLine():
            Line((17.128542308, 19.614526765), (14.226497308, 24.641016151))
            Line((14.226497308, 24.641016151), (-14.226497308, 24.641016151))
            Line((-14.226497308, 24.641016151), (-17.128542308, 19.614526765))
            ThreePointArc((-17.128542308, 19.614526765), (-12.013676709, 18.47426223), (-8.1778047, 14.903808583))
            ThreePointArc((-8.1778047, 14.903808583), (0, 17), (8.1778047, 14.903808583))
            ThreePointArc((8.1778047, 14.903808583), (12.013676709, 18.47426223), (17.128542308, 19.614526765))
        make_face()
    extrude(amount=-CUT_EXTRUDE_4_DEPTH, mode=Mode.SUBTRACT)

    # 圆角1
    fillet_1_edges = [part.edges().sort_by_distance(p)[0] for p in [
        (-8.1778047, 2.5, 14.903808583),
        (-17.128542308, 2.5, 19.614526765),
        (-14.226497308, 2.5, 24.641016151),
        (14.226497308, 2.5, 24.641016151),
        (17.128542308, 2.5, 19.614526765),
        (8.1778047, 2.5, 14.903808583),
        (16.995979196, 2.5, -0.369717674),
        (25.550949616, 2.5, 5.026489386),
        (28.452994616, 2.5, 0),
        (14.226497308, 2.5, -24.641016151),
        (8.422407308, 2.5, -24.641016151),
        (8.818174496, 2.5, -14.534090909),
        (-25.550949616, 2.5, 5.026489386),
        (-16.995979196, 2.5, -0.369717674),
        (-8.818174496, 2.5, -14.534090909),
        (-8.422407308, 2.5, -24.641016151),
        (-14.226497308, 2.5, -24.641016151),
        (-28.452994616, 2.5, 0),
    ]]
    fillet(fillet_1_edges, radius=FILLET_1_R)

    # 圆角2
    fillet_2_edges = [part.edges().sort_by_distance(p)[0] for p in [
        (-20, 2.5, 34.641016151),
        (-40, 2.5, 0),
        (-32.32124142, 2.5, -13.3),
        (-40, 2.5, -26.6),
        (-83.5, 2.5, -26.6),
        (-83.5, 2.5, -46.6),
        (13.095477456, 2.5, -46.6),
        (40, 2.5, 0),
        (20, 2.5, 34.641016151),
    ]]
    fillet(fillet_2_edges, radius=FILLET_2_R)

    # 草图5 → 切除-拉伸5 (cut)
    with BuildSketch(Plane.XZ):
        with Locations(Location((-31.401807915, -29.375609946, 0), (0, 0, 270))):
            Circle(SKETCH_5_R)
        with Locations(Location((-14.716714858, -40.403196703, 0), (0, 0, 270))):
            Circle(SKETCH_5_R)
        with Locations(Location((5.152091527, -42.690232523, 0), (0, 0, 270))):
            Circle(SKETCH_5_R)
        with Locations(Location((-34.847908473, -42.690232523, 0), (0, 0, 270))):
            Circle(SKETCH_5_R)
    extrude(amount=-CUT_EXTRUDE_5_DEPTH, mode=Mode.SUBTRACT)


solid = part.part
